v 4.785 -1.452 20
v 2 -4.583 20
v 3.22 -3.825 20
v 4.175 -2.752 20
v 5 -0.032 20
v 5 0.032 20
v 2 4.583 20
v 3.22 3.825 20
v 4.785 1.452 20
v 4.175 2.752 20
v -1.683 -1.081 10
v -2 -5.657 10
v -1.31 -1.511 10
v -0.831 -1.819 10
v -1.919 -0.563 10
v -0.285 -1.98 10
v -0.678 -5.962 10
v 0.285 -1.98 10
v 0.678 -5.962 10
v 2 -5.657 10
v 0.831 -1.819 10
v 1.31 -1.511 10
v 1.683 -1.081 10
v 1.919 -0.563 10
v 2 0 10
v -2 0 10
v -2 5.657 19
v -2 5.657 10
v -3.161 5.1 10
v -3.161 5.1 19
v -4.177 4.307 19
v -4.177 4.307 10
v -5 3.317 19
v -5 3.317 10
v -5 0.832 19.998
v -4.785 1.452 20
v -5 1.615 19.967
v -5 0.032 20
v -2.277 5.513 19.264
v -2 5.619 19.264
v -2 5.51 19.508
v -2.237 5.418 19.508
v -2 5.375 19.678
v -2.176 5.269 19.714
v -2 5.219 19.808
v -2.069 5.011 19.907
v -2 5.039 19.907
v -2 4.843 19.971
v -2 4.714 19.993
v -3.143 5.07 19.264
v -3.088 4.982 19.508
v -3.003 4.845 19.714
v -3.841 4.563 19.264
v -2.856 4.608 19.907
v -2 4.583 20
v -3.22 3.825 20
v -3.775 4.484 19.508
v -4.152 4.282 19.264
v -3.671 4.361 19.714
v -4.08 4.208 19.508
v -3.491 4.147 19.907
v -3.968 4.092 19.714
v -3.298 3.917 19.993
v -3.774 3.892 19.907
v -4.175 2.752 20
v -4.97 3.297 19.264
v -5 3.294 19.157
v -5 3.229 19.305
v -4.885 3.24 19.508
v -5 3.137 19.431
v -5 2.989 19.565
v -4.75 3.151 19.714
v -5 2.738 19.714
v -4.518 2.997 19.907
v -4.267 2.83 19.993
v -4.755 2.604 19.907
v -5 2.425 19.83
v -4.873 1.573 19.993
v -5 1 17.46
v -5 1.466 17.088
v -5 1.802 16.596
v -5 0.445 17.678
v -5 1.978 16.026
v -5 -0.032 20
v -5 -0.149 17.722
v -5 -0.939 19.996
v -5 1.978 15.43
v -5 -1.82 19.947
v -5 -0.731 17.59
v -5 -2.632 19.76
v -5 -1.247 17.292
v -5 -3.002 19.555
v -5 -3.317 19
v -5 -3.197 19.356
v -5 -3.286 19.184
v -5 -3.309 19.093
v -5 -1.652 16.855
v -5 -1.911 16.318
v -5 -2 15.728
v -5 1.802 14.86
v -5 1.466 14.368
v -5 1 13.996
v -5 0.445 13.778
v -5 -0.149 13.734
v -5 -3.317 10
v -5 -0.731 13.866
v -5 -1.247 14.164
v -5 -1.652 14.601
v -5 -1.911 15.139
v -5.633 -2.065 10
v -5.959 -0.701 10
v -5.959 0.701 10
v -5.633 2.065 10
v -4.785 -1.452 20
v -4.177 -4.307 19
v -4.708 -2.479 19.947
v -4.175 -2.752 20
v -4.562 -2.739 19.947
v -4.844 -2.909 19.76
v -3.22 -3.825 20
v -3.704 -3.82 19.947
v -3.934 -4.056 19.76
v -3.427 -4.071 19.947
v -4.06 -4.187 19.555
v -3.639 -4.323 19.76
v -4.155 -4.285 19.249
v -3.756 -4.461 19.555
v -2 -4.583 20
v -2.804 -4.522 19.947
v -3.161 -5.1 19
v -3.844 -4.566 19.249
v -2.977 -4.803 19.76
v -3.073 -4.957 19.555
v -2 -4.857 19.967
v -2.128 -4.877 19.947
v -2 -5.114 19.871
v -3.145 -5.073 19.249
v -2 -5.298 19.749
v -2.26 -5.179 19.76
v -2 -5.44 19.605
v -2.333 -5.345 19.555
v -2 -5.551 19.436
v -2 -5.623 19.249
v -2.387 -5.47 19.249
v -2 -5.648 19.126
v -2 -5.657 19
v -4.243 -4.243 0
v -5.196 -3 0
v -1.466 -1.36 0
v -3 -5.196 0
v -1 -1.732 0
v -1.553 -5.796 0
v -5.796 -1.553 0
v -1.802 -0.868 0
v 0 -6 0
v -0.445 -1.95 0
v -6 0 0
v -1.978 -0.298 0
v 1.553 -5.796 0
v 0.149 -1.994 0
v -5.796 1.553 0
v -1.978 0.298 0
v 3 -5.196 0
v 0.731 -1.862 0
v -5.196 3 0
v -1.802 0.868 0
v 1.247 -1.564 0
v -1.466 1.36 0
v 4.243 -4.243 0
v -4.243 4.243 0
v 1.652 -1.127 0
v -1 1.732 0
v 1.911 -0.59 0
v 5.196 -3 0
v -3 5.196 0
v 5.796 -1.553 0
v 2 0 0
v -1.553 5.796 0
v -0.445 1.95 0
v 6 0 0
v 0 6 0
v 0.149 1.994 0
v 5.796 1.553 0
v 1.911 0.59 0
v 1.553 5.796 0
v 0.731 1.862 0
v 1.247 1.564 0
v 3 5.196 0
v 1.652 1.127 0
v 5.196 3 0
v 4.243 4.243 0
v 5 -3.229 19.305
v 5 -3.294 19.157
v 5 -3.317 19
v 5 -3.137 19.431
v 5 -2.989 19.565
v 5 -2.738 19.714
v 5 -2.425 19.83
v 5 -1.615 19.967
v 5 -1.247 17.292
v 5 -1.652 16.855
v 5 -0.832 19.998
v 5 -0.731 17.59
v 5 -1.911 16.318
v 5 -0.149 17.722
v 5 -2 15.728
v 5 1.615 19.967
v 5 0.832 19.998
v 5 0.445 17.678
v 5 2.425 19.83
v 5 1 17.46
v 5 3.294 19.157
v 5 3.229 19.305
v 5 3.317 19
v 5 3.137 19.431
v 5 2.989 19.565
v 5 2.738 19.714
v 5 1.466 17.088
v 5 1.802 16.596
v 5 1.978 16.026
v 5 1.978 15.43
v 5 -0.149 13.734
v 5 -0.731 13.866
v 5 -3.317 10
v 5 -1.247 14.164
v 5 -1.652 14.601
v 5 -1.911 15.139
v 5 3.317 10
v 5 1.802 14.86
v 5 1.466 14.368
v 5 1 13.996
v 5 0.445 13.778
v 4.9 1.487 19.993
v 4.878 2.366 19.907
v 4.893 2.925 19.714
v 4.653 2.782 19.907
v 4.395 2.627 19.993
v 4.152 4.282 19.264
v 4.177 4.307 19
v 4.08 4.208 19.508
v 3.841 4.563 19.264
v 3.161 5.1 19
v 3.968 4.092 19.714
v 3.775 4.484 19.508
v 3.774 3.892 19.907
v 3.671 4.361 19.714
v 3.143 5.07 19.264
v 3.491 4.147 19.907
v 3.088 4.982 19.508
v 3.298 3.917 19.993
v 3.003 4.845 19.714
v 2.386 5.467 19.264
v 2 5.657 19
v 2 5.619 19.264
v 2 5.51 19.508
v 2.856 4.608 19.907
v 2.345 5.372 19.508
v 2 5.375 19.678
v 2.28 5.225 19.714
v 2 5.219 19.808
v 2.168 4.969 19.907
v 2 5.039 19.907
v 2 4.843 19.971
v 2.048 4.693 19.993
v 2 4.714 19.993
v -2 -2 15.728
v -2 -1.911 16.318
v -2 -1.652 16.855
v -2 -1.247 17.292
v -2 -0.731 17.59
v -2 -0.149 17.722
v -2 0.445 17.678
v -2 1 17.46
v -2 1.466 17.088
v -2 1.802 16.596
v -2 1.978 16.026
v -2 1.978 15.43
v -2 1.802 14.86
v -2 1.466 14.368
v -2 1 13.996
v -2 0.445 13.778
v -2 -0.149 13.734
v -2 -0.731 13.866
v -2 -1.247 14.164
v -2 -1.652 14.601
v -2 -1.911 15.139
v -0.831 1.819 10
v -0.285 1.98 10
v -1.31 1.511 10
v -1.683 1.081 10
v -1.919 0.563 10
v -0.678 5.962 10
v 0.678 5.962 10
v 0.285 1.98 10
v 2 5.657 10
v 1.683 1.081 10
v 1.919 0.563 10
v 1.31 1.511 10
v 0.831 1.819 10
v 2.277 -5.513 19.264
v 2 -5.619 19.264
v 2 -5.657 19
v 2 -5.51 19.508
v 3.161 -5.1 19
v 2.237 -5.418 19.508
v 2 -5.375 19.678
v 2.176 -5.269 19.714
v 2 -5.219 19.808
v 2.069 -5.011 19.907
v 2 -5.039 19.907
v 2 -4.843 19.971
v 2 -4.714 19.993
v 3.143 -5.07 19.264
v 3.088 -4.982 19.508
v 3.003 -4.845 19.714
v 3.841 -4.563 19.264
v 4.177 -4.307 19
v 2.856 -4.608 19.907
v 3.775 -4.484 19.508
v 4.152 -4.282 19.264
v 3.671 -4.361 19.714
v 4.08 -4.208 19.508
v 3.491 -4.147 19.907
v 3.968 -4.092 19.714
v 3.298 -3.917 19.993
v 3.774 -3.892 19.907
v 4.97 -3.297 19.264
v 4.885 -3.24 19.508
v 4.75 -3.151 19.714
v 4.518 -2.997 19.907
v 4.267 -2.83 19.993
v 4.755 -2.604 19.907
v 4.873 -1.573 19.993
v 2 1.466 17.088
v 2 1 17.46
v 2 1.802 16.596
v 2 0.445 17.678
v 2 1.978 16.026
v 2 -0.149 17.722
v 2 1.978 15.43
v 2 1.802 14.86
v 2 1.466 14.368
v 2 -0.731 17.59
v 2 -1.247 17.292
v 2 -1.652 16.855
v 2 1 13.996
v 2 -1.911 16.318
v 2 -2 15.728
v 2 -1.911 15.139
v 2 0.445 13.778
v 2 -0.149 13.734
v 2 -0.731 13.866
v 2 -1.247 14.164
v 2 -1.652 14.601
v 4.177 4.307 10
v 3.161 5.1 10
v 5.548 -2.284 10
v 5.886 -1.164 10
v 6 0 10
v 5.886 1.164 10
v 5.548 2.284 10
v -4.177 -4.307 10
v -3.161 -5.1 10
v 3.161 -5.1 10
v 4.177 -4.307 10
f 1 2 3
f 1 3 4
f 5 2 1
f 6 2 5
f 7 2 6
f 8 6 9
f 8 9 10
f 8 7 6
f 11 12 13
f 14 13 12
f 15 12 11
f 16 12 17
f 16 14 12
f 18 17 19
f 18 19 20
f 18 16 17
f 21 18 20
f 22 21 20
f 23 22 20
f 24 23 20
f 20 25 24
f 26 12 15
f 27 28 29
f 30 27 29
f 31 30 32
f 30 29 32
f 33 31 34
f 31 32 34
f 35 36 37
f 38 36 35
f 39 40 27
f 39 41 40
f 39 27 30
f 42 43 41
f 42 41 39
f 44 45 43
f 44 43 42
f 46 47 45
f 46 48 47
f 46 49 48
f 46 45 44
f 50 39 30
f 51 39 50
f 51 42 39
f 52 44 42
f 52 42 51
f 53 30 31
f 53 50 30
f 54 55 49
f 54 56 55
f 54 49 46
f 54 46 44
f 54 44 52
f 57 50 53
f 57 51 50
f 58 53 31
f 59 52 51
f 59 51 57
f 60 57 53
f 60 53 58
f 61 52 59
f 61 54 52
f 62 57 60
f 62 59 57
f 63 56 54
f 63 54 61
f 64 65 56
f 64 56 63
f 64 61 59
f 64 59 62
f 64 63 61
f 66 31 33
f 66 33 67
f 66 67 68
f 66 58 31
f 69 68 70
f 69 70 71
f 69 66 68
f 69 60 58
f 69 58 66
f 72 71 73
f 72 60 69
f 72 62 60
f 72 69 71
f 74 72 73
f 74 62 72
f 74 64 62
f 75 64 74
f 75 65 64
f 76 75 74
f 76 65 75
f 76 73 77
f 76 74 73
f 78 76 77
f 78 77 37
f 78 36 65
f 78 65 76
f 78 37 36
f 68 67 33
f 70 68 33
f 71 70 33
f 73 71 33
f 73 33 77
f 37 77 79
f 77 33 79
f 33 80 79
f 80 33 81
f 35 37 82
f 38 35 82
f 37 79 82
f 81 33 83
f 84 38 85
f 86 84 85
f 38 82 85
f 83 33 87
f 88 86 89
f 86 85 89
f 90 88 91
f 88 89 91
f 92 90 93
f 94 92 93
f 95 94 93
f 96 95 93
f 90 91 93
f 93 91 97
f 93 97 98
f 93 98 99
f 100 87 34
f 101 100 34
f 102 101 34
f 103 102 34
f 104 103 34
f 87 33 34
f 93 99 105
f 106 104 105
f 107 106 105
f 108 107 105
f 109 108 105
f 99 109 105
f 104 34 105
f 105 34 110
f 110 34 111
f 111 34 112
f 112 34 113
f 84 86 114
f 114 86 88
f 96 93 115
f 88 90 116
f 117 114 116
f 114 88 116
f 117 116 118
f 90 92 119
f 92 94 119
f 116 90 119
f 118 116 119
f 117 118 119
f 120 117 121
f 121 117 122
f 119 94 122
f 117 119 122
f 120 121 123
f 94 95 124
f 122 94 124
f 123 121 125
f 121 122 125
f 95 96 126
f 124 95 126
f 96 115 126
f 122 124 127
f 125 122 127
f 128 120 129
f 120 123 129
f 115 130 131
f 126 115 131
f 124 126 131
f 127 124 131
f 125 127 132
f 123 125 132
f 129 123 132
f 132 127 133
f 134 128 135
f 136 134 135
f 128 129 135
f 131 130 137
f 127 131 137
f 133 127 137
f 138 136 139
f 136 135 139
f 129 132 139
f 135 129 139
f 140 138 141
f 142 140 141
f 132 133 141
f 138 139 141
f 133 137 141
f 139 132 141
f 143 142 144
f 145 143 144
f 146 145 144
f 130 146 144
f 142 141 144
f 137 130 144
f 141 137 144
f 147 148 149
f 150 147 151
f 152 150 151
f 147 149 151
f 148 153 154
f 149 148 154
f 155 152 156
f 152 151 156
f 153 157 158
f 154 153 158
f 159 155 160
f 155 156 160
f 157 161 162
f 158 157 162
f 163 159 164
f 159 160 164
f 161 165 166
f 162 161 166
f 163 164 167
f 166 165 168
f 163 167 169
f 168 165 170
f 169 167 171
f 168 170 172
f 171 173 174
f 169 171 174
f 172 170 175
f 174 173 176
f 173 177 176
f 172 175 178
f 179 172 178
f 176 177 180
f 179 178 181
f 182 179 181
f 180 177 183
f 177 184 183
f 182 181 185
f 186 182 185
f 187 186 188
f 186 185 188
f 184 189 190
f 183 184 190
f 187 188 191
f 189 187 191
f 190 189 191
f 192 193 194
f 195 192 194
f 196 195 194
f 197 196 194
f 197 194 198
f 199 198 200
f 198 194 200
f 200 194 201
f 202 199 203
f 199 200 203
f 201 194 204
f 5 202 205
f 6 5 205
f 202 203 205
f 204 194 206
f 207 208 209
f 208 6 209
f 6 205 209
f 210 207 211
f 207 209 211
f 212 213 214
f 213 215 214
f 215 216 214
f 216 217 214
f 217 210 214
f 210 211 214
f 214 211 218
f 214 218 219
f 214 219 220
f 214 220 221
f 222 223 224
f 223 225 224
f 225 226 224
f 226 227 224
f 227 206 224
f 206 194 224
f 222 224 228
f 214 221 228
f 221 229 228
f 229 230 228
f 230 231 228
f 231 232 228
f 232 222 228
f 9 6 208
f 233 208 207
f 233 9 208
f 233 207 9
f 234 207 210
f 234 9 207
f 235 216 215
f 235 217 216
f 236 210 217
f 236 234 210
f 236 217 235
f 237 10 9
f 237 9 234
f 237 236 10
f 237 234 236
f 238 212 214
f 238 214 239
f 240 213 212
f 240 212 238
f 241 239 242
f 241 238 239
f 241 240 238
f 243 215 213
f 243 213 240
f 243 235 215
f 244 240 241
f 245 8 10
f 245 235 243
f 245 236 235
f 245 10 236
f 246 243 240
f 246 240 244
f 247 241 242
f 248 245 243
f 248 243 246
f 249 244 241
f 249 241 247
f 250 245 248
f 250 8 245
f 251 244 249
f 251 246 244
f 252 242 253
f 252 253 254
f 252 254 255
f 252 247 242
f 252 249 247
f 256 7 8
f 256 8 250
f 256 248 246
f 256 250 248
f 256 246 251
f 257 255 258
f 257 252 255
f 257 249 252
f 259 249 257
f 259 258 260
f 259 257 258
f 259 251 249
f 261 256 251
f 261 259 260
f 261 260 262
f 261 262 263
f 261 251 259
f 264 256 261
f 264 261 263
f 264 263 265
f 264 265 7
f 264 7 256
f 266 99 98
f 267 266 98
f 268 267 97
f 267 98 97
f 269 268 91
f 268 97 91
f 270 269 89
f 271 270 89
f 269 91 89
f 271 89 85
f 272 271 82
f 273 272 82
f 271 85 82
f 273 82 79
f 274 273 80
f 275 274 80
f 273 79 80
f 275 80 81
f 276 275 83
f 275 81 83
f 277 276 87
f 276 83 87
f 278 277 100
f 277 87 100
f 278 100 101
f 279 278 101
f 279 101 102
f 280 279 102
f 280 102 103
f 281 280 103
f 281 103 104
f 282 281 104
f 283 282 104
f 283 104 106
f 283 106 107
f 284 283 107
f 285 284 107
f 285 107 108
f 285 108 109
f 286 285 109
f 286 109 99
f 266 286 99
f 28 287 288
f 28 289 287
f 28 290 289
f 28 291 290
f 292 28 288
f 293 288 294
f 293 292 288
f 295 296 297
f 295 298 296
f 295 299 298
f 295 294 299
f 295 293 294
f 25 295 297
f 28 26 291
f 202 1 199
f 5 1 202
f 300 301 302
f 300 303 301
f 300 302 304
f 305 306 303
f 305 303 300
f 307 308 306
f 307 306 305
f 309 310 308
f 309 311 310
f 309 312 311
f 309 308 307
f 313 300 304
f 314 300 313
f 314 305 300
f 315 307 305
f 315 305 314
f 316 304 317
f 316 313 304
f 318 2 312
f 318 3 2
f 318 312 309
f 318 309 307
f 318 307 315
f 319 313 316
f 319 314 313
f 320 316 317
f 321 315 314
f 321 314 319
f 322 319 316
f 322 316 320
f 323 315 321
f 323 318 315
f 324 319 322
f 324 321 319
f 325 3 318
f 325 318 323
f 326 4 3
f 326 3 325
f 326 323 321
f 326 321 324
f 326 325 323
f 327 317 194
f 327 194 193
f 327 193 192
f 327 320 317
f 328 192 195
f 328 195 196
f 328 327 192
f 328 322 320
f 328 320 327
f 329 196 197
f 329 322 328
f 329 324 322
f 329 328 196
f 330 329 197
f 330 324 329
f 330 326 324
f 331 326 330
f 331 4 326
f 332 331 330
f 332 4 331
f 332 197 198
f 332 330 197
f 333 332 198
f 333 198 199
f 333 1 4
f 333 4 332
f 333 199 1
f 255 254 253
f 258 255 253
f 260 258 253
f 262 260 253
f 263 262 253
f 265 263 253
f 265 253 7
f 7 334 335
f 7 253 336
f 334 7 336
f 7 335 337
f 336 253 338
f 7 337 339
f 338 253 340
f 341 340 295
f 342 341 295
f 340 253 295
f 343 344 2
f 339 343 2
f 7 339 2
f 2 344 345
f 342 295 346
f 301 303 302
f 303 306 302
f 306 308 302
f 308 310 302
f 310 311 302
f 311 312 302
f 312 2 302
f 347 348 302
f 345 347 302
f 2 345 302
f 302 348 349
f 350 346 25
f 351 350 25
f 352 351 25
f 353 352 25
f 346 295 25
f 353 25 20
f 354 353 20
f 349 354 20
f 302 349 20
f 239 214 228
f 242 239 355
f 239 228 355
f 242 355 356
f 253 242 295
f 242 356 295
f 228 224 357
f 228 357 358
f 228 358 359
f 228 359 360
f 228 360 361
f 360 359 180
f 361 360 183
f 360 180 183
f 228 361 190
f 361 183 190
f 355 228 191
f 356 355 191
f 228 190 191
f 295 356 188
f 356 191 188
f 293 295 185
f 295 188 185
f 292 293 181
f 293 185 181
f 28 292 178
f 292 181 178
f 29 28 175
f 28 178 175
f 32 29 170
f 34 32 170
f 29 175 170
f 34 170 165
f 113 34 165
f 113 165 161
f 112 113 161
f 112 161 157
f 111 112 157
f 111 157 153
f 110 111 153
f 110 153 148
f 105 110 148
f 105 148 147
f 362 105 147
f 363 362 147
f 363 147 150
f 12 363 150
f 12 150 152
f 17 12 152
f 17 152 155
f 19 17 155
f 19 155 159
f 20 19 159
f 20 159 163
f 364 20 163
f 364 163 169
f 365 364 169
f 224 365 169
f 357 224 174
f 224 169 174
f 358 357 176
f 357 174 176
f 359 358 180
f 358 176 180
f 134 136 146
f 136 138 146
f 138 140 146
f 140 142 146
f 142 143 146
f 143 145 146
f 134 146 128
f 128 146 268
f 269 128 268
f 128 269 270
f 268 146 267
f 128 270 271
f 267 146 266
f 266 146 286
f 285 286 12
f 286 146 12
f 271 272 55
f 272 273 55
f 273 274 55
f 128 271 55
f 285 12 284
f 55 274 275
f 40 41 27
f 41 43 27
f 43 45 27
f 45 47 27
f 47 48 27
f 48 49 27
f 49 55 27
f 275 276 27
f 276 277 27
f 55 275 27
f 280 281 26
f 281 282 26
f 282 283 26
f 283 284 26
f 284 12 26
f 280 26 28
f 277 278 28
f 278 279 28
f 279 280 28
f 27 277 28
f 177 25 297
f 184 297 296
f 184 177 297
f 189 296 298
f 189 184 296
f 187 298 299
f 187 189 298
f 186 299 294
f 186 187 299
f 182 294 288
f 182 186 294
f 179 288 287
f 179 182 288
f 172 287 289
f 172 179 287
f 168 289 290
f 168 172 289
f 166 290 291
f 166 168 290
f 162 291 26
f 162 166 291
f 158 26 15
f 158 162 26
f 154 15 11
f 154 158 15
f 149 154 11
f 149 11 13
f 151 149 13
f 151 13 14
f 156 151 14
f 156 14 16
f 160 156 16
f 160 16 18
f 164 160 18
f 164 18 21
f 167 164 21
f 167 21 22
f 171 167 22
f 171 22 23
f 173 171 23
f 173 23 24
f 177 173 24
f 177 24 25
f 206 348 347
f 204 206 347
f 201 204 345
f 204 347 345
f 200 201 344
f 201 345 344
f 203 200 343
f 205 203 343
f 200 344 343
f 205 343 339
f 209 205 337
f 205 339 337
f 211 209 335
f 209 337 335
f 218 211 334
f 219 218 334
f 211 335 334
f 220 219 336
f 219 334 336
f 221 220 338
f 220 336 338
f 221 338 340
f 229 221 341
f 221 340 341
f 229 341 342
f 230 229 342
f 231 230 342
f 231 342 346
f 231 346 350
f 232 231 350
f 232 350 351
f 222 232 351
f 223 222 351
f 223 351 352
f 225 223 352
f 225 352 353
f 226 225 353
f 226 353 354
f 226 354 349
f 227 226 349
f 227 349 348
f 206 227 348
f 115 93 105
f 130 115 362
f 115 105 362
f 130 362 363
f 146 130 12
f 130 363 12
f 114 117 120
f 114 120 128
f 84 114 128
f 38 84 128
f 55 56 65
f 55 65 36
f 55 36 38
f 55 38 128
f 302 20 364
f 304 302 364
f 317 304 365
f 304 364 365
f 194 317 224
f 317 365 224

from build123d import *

# Parameters (mm, degrees)
SKETCH_1_R          = 6
SKETCH_1_R_2        = 2
EXTRUDE_1_DEPTH     = 10
EXTRUDE_2_DEPTH     = 10
SKETCH_3_R          = 2
CUT_EXTRUDE_3_DEPTH = 24.600847442
FILLET_1_R          = 1


with BuildPart() as part:
    # Эскиз1 → Вытянуть1 (new body)
    with BuildSketch(Plane.XY):
        Circle(SKETCH_1_R)
        Circle(SKETCH_1_R_2, mode=Mode.SUBTRACT)
    extrude(amount=EXTRUDE_1_DEPTH)

    # Эскиз2 → Вытянуть2 (add)
    with BuildSketch(Plane.XY.offset(10)):
        with BuildLine():
            Line((-5, 3.31662479), (-5, -3.31662479))
            ThreePointArc((-5, -3.31662479), (-3.69041576, -4.730838353), (-2, -5.656854249))
            Line((-2, -5.656854249), (-2, 5.656854249))
            ThreePointArc((-2, 5.656854249), (-3.69041576, 4.730838353), (-5, 3.31662479))
        make_face()
        with BuildLine():
            Line((2, 5.656854249), (2, -5.656854249))
            ThreePointArc((2, -5.656854249), (3.69041576, -4.730838353), (5, -3.31662479))
            Line((5, -3.31662479), (5, 3.31662479))
            ThreePointArc((5, 3.31662479), (3.69041576, 4.730838353), (2, 5.656854249))
        make_face()
    extrude(amount=EXTRUDE_2_DEPTH)

    # Эскиз3 → Вытянуть3 (cut, through all)
    with BuildSketch(Plane.ZY.offset(5)):
        with Locations(Location((15.728074635, 0, 0), (0, 0, 270))):
            Circle(SKETCH_3_R)
    extrude(amount=-CUT_EXTRUDE_3_DEPTH, mode=Mode.SUBTRACT)

    # Скругление1
    fillet_1_edges = [part.edges().sort_by_distance(p)[0] for p in [
        (-3.69041576, 4.730838353, 20),
        (-3.69041576, -4.730838353, 20),
        (3.69041576, -4.730838353, 20),
        (3.69041576, 4.730838353, 20),
    ]]
    fillet(fillet_1_edges, radius=FILLET_1_R - 0.0001)  # a hair under: the kernel refuses the full size


solid = part.part
